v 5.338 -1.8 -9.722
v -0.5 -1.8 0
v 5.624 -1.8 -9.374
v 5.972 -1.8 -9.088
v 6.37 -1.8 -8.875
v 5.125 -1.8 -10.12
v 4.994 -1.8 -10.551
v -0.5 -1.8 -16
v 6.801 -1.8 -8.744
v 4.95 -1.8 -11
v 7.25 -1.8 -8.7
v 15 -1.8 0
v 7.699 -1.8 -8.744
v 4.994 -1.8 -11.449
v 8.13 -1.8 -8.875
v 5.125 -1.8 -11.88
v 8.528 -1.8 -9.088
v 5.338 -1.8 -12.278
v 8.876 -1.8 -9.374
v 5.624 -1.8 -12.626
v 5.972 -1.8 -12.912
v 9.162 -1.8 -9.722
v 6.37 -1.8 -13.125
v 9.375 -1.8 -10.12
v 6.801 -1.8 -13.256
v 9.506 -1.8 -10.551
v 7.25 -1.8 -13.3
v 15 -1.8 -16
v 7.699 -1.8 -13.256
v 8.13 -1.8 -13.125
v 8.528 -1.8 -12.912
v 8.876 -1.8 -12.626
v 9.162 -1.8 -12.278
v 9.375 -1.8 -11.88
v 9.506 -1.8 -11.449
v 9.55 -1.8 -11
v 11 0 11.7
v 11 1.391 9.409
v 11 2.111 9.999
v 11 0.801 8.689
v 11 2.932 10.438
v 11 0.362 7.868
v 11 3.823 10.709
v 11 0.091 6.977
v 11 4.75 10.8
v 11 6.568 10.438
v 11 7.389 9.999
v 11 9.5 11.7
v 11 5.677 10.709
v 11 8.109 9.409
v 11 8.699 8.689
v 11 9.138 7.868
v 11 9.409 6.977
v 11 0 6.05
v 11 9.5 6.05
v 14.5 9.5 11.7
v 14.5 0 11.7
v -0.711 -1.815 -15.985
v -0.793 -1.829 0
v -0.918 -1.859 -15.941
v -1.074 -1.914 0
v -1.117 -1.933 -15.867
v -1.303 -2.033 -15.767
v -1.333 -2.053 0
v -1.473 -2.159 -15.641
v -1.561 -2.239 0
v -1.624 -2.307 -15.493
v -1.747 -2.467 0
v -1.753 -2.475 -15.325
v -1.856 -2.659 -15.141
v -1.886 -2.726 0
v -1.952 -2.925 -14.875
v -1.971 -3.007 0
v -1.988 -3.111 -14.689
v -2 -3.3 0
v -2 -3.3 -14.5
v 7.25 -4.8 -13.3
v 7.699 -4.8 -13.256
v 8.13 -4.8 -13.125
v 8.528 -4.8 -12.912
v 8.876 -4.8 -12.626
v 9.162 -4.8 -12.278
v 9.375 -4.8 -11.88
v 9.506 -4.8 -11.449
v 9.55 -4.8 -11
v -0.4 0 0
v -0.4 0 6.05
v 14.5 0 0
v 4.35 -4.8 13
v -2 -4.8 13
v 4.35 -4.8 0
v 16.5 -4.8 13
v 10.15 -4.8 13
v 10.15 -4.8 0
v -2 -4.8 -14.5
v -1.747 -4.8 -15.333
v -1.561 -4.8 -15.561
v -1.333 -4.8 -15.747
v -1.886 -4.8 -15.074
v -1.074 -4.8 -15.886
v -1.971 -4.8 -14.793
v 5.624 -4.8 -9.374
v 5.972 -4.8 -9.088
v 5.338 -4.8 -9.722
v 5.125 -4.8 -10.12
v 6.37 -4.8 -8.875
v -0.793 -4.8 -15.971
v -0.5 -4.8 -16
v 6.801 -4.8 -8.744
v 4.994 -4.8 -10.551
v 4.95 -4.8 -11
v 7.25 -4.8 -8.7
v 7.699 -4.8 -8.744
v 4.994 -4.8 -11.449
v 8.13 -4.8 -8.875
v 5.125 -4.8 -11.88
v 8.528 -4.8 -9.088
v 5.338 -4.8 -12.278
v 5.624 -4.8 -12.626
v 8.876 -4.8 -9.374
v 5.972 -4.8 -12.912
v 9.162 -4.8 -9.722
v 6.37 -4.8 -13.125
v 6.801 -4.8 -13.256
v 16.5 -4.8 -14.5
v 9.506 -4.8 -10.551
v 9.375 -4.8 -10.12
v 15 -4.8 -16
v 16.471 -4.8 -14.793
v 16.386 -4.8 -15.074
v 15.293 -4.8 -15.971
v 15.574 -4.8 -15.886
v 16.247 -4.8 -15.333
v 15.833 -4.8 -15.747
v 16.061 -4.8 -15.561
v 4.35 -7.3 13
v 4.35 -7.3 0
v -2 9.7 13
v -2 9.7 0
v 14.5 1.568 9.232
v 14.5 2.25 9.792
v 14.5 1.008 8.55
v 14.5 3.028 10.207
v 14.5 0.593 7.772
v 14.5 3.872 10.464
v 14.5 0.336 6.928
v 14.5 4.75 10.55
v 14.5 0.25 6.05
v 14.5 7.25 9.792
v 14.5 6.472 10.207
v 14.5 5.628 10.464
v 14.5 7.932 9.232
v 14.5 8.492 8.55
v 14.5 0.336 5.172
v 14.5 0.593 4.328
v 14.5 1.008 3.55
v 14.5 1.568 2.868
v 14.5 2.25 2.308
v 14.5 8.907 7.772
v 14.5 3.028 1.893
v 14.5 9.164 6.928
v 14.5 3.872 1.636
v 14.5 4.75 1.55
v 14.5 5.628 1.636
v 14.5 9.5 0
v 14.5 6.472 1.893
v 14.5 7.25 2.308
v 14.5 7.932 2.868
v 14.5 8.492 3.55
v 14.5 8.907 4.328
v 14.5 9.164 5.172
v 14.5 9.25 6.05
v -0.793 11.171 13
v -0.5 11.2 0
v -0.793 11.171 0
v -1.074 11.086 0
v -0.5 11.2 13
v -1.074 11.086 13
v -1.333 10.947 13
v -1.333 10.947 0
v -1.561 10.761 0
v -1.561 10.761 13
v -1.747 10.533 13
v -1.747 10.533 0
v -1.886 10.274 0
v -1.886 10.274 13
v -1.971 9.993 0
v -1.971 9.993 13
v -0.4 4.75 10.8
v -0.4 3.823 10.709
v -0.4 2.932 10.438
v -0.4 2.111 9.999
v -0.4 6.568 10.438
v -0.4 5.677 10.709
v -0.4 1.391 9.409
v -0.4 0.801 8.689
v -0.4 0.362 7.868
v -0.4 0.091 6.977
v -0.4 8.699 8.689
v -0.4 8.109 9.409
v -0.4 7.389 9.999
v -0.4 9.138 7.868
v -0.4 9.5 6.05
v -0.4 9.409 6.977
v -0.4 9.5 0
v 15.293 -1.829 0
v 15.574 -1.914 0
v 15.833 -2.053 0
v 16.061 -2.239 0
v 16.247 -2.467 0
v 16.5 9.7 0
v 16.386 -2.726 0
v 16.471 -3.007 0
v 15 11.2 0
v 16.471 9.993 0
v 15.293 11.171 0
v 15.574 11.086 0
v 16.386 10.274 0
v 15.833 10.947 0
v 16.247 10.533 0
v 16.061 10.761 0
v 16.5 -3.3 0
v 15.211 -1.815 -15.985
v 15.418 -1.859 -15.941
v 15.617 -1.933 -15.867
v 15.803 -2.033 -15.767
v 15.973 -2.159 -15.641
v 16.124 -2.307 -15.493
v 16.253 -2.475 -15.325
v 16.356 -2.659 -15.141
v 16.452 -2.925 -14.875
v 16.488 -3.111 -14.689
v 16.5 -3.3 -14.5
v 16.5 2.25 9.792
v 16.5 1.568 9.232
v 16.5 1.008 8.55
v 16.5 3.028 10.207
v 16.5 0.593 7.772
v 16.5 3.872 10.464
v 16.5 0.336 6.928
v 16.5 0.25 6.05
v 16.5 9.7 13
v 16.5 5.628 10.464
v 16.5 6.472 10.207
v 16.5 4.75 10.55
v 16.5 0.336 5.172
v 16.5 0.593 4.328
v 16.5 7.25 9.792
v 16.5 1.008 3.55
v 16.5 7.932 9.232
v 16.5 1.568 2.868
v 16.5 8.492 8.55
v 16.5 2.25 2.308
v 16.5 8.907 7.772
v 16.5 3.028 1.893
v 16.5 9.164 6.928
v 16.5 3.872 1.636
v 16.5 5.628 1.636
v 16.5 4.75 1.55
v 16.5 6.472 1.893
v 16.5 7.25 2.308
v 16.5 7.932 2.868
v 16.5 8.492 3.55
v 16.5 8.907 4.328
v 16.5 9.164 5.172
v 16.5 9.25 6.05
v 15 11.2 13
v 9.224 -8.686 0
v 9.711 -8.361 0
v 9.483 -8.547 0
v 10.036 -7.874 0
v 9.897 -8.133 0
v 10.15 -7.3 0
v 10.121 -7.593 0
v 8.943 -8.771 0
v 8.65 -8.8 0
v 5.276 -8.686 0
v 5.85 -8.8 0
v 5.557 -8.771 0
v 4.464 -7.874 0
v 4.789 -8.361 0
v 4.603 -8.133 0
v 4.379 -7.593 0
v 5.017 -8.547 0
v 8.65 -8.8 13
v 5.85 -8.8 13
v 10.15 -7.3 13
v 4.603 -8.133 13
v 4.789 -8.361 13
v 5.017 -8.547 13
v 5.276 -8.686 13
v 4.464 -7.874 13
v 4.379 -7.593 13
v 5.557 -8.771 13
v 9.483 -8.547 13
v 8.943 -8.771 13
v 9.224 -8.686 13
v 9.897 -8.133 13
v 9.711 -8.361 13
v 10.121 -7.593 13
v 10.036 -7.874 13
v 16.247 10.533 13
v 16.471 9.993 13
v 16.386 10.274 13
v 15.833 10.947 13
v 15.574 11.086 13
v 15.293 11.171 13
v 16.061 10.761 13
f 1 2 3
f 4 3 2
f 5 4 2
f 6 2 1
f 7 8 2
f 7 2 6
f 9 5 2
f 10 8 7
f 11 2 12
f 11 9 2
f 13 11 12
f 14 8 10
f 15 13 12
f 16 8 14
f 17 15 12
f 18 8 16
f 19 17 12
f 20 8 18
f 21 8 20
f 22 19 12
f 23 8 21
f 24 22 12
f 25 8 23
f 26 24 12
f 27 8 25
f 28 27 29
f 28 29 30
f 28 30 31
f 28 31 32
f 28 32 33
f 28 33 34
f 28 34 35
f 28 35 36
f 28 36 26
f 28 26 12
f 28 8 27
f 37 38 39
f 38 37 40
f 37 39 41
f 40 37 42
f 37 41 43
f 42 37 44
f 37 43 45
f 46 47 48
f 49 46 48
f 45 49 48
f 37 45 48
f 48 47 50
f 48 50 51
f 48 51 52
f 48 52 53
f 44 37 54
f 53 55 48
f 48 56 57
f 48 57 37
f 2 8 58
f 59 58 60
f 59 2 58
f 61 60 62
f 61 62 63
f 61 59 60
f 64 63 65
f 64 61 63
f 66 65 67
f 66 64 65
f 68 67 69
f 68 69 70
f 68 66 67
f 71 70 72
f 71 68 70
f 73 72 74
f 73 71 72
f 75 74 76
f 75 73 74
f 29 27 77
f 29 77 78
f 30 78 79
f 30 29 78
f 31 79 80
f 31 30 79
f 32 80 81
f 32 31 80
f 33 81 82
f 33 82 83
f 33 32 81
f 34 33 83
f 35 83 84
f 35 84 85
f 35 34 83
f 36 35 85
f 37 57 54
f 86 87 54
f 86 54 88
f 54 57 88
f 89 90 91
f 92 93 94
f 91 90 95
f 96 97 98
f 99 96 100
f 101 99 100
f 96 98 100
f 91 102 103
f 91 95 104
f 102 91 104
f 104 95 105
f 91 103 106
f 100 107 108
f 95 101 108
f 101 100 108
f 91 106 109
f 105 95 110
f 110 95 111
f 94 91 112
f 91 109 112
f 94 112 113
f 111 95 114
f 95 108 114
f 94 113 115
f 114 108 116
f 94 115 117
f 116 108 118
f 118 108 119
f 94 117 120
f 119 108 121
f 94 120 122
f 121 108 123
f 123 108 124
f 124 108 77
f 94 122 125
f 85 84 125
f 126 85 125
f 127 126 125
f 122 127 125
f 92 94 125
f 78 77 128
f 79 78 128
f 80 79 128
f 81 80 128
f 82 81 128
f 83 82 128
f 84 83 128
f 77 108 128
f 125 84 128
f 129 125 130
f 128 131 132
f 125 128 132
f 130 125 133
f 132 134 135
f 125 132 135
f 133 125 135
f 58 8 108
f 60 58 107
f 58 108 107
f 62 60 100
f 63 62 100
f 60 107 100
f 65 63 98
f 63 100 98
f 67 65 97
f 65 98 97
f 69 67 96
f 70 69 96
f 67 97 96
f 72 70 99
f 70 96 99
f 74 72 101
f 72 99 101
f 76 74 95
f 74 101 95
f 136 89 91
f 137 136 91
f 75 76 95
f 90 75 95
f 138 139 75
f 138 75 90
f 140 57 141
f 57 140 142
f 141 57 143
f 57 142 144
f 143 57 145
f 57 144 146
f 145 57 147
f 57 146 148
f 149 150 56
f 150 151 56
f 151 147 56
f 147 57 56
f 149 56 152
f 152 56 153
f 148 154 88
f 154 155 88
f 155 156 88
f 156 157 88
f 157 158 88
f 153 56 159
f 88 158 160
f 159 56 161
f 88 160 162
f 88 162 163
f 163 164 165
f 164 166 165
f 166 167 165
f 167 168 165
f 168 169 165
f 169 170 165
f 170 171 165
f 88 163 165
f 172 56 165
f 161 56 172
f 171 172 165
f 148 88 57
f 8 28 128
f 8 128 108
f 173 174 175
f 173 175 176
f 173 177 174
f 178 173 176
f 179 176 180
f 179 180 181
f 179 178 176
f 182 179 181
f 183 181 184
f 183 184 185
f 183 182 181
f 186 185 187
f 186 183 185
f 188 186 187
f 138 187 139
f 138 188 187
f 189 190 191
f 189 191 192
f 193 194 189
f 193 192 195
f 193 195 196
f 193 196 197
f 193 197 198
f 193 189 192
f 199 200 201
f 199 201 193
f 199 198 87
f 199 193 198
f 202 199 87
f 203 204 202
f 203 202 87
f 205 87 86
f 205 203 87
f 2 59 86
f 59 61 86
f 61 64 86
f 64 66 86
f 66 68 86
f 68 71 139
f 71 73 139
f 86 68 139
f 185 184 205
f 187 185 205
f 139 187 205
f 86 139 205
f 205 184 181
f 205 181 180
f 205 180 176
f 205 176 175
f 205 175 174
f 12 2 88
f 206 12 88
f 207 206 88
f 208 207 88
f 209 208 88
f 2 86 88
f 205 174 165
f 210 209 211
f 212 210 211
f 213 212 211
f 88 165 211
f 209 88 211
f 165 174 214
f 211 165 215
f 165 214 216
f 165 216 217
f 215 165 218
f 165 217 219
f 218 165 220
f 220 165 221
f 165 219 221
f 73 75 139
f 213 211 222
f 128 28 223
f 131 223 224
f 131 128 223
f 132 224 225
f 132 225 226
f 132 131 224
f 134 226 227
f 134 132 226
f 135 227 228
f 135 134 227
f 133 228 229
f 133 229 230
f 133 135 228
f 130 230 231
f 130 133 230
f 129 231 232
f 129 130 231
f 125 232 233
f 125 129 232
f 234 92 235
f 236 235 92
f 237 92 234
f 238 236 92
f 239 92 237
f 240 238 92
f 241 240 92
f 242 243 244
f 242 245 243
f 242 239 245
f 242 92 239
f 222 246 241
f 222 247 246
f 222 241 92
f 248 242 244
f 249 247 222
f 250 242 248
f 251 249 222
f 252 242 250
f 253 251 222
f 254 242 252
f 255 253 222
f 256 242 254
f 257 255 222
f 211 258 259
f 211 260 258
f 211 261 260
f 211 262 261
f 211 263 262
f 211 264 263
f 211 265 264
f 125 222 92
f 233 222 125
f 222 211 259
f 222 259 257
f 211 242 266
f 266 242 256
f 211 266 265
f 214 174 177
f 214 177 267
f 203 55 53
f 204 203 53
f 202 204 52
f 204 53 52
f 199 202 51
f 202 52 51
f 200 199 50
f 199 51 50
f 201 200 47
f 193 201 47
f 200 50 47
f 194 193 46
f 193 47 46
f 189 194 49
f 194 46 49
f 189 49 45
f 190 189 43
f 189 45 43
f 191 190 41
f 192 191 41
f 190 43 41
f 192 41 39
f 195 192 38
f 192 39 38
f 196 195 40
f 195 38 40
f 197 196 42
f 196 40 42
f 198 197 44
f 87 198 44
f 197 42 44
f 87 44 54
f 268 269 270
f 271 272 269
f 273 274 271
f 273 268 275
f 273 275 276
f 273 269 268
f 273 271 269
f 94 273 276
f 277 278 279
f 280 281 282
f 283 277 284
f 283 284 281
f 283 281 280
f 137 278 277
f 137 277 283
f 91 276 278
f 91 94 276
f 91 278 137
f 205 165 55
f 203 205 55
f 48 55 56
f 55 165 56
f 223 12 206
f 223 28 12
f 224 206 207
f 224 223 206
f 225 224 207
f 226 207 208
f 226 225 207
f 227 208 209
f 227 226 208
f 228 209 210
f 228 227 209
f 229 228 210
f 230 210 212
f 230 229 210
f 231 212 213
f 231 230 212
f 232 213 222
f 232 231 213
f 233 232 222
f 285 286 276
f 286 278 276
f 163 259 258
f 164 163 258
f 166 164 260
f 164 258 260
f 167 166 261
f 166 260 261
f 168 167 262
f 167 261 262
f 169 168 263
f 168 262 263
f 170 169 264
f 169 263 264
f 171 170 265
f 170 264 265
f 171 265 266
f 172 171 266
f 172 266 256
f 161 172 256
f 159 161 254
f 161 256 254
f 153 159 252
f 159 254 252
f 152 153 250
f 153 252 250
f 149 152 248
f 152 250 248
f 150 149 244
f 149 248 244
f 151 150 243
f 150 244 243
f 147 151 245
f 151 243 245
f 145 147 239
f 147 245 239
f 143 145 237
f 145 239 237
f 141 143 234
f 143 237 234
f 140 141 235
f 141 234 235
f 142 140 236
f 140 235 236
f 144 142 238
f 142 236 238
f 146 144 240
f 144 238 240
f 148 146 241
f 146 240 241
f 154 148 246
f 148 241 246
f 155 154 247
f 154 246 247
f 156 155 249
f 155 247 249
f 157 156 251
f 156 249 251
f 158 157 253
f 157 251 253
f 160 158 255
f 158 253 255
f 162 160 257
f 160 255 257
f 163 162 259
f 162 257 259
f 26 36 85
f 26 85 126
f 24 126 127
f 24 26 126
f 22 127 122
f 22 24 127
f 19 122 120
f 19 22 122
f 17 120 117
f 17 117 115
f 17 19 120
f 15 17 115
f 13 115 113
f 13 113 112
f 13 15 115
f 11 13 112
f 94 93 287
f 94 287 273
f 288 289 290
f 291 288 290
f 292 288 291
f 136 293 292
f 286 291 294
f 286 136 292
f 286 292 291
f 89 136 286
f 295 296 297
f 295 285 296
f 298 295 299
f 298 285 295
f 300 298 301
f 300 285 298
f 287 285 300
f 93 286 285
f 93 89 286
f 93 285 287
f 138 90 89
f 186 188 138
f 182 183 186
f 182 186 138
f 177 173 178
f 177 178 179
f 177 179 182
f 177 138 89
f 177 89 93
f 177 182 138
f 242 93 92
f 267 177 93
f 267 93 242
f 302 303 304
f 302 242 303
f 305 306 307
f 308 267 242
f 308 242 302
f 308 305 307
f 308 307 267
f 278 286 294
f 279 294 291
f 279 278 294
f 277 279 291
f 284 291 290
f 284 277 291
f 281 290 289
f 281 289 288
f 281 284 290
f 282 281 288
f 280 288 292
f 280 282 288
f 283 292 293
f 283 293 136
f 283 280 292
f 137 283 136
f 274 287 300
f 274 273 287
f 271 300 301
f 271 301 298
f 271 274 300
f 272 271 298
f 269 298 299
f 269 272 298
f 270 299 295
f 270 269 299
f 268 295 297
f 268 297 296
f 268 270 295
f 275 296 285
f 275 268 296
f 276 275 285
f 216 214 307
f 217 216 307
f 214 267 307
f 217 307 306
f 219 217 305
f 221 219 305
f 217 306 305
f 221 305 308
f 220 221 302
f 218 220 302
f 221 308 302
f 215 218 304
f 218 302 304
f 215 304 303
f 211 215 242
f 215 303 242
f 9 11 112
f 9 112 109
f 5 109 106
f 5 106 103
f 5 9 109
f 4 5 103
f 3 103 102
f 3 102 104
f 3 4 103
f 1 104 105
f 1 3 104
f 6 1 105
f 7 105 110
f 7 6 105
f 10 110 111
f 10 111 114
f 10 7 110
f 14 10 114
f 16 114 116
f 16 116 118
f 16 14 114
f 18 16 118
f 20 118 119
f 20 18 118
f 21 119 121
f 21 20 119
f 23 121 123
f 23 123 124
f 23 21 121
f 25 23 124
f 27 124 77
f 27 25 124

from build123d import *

# Parameters (mm, degrees)
SKETCH_1_W          = 18.5
SKETCH_1_H          = 13
EXTRUDE_1_DEPTH     = 13
SKETCH_2_R          = 4.5
CUT_EXTRUDE_1_DEPTH = 2
CUT_EXTRUDE_START   = -2
CUT_EXTRUDE_2_DEPTH = 14.9
SKETCH_3_W          = 3.5
SKETCH_3_H          = 9.5
CUT_EXTRUDE_3_DEPTH = 11.7
SKETCH_4_W          = 18.5
SKETCH_4_H          = 29
SKETCH_4_R          = 2.3
EXTRUDE_2_DEPTH     = 3
SKETCH_4_3_W        = 5.8
SKETCH_4_3_H        = 13
EXTRUDE_3_DEPTH     = 7
FILLET_1_R          = 1.5


with BuildPart() as part:
    # 草图1 → 凸台-拉伸1 (new body)
    with BuildSketch(Plane.XY):
        with Locations((7.25, 4.7)):
            Rectangle(SKETCH_1_W, SKETCH_1_H)
    extrude(amount=EXTRUDE_1_DEPTH)

    # 草图2 → 切除-拉伸1 (cut)
    with BuildSketch(Plane(origin=(16.5, 0, 0), x_dir=(0, 0, -1), z_dir=(1, 0, 0))):
        with Locations((-6.05, 4.75)):
            Circle(SKETCH_2_R)
    extrude(amount=-CUT_EXTRUDE_1_DEPTH, mode=Mode.SUBTRACT)

    # 草图2<3> → 切除-拉伸2 (cut)
    with BuildSketch(Plane(origin=(16.5, 0, 0), x_dir=(0, 0, -1), z_dir=(1, 0, 0)).offset(CUT_EXTRUDE_START)):
        with BuildLine():
            Line((0, 9.5), (-6.05, 9.5))
            ThreePointArc((-6.05, 9.5), (-10.8, 4.75), (-6.05, 0))
            Line((-6.05, 0), (0, 0))
            Line((0, 0), (0, 9.5))
        make_face()
    extrude(amount=-CUT_EXTRUDE_2_DEPTH, mode=Mode.SUBTRACT)

    # 草图3 → 切除-拉伸3 (cut)
    with BuildSketch(Plane(origin=(0, 0, 0), x_dir=(-1, 0, 0), z_dir=(0, 0, -1))):
        with Locations((-12.75, 4.75)):
            Rectangle(SKETCH_3_W, SKETCH_3_H)
    extrude(amount=-CUT_EXTRUDE_3_DEPTH, mode=Mode.SUBTRACT)

    # 草图4 → 凸台-拉伸2 (add)
    with BuildSketch(Plane(origin=(0, -1.8, 0), x_dir=(1, 0, 0), z_dir=(0, 1, 0))):
        with Locations((7.25, 1.5)):
            Rectangle(SKETCH_4_W, SKETCH_4_H)
        with Locations((7.25, 11)):
            Circle(SKETCH_4_R, mode=Mode.SUBTRACT)
    extrude(amount=-EXTRUDE_2_DEPTH)

    # 草图4<3> → 凸台-拉伸3 (add)
    with BuildSketch(Plane(origin=(0, -1.8, 0), x_dir=(1, 0, 0), z_dir=(0, 1, 0))):
        with Locations((7.25, -6.5)):
            Rectangle(SKETCH_4_3_W, SKETCH_4_3_H)
    extrude(amount=-EXTRUDE_3_DEPTH)

    # 圆角1
    fillet_1_edges = [part.edges().sort_by_distance(p)[0] for p in [
        (10.15, -8.8, 6.5),
        (4.35, -8.8, 6.5),
        (-2, -3.3, -16),
        (16.5, -3.3, -16),
        (-2, -1.8, -8),
        (16.5, -1.8, -8),
        (16.5, 11.2, 6.5),
        (-2, 11.2, 6.5),
    ]]
    fillet(fillet_1_edges, radius=FILLET_1_R)


solid = part.part
